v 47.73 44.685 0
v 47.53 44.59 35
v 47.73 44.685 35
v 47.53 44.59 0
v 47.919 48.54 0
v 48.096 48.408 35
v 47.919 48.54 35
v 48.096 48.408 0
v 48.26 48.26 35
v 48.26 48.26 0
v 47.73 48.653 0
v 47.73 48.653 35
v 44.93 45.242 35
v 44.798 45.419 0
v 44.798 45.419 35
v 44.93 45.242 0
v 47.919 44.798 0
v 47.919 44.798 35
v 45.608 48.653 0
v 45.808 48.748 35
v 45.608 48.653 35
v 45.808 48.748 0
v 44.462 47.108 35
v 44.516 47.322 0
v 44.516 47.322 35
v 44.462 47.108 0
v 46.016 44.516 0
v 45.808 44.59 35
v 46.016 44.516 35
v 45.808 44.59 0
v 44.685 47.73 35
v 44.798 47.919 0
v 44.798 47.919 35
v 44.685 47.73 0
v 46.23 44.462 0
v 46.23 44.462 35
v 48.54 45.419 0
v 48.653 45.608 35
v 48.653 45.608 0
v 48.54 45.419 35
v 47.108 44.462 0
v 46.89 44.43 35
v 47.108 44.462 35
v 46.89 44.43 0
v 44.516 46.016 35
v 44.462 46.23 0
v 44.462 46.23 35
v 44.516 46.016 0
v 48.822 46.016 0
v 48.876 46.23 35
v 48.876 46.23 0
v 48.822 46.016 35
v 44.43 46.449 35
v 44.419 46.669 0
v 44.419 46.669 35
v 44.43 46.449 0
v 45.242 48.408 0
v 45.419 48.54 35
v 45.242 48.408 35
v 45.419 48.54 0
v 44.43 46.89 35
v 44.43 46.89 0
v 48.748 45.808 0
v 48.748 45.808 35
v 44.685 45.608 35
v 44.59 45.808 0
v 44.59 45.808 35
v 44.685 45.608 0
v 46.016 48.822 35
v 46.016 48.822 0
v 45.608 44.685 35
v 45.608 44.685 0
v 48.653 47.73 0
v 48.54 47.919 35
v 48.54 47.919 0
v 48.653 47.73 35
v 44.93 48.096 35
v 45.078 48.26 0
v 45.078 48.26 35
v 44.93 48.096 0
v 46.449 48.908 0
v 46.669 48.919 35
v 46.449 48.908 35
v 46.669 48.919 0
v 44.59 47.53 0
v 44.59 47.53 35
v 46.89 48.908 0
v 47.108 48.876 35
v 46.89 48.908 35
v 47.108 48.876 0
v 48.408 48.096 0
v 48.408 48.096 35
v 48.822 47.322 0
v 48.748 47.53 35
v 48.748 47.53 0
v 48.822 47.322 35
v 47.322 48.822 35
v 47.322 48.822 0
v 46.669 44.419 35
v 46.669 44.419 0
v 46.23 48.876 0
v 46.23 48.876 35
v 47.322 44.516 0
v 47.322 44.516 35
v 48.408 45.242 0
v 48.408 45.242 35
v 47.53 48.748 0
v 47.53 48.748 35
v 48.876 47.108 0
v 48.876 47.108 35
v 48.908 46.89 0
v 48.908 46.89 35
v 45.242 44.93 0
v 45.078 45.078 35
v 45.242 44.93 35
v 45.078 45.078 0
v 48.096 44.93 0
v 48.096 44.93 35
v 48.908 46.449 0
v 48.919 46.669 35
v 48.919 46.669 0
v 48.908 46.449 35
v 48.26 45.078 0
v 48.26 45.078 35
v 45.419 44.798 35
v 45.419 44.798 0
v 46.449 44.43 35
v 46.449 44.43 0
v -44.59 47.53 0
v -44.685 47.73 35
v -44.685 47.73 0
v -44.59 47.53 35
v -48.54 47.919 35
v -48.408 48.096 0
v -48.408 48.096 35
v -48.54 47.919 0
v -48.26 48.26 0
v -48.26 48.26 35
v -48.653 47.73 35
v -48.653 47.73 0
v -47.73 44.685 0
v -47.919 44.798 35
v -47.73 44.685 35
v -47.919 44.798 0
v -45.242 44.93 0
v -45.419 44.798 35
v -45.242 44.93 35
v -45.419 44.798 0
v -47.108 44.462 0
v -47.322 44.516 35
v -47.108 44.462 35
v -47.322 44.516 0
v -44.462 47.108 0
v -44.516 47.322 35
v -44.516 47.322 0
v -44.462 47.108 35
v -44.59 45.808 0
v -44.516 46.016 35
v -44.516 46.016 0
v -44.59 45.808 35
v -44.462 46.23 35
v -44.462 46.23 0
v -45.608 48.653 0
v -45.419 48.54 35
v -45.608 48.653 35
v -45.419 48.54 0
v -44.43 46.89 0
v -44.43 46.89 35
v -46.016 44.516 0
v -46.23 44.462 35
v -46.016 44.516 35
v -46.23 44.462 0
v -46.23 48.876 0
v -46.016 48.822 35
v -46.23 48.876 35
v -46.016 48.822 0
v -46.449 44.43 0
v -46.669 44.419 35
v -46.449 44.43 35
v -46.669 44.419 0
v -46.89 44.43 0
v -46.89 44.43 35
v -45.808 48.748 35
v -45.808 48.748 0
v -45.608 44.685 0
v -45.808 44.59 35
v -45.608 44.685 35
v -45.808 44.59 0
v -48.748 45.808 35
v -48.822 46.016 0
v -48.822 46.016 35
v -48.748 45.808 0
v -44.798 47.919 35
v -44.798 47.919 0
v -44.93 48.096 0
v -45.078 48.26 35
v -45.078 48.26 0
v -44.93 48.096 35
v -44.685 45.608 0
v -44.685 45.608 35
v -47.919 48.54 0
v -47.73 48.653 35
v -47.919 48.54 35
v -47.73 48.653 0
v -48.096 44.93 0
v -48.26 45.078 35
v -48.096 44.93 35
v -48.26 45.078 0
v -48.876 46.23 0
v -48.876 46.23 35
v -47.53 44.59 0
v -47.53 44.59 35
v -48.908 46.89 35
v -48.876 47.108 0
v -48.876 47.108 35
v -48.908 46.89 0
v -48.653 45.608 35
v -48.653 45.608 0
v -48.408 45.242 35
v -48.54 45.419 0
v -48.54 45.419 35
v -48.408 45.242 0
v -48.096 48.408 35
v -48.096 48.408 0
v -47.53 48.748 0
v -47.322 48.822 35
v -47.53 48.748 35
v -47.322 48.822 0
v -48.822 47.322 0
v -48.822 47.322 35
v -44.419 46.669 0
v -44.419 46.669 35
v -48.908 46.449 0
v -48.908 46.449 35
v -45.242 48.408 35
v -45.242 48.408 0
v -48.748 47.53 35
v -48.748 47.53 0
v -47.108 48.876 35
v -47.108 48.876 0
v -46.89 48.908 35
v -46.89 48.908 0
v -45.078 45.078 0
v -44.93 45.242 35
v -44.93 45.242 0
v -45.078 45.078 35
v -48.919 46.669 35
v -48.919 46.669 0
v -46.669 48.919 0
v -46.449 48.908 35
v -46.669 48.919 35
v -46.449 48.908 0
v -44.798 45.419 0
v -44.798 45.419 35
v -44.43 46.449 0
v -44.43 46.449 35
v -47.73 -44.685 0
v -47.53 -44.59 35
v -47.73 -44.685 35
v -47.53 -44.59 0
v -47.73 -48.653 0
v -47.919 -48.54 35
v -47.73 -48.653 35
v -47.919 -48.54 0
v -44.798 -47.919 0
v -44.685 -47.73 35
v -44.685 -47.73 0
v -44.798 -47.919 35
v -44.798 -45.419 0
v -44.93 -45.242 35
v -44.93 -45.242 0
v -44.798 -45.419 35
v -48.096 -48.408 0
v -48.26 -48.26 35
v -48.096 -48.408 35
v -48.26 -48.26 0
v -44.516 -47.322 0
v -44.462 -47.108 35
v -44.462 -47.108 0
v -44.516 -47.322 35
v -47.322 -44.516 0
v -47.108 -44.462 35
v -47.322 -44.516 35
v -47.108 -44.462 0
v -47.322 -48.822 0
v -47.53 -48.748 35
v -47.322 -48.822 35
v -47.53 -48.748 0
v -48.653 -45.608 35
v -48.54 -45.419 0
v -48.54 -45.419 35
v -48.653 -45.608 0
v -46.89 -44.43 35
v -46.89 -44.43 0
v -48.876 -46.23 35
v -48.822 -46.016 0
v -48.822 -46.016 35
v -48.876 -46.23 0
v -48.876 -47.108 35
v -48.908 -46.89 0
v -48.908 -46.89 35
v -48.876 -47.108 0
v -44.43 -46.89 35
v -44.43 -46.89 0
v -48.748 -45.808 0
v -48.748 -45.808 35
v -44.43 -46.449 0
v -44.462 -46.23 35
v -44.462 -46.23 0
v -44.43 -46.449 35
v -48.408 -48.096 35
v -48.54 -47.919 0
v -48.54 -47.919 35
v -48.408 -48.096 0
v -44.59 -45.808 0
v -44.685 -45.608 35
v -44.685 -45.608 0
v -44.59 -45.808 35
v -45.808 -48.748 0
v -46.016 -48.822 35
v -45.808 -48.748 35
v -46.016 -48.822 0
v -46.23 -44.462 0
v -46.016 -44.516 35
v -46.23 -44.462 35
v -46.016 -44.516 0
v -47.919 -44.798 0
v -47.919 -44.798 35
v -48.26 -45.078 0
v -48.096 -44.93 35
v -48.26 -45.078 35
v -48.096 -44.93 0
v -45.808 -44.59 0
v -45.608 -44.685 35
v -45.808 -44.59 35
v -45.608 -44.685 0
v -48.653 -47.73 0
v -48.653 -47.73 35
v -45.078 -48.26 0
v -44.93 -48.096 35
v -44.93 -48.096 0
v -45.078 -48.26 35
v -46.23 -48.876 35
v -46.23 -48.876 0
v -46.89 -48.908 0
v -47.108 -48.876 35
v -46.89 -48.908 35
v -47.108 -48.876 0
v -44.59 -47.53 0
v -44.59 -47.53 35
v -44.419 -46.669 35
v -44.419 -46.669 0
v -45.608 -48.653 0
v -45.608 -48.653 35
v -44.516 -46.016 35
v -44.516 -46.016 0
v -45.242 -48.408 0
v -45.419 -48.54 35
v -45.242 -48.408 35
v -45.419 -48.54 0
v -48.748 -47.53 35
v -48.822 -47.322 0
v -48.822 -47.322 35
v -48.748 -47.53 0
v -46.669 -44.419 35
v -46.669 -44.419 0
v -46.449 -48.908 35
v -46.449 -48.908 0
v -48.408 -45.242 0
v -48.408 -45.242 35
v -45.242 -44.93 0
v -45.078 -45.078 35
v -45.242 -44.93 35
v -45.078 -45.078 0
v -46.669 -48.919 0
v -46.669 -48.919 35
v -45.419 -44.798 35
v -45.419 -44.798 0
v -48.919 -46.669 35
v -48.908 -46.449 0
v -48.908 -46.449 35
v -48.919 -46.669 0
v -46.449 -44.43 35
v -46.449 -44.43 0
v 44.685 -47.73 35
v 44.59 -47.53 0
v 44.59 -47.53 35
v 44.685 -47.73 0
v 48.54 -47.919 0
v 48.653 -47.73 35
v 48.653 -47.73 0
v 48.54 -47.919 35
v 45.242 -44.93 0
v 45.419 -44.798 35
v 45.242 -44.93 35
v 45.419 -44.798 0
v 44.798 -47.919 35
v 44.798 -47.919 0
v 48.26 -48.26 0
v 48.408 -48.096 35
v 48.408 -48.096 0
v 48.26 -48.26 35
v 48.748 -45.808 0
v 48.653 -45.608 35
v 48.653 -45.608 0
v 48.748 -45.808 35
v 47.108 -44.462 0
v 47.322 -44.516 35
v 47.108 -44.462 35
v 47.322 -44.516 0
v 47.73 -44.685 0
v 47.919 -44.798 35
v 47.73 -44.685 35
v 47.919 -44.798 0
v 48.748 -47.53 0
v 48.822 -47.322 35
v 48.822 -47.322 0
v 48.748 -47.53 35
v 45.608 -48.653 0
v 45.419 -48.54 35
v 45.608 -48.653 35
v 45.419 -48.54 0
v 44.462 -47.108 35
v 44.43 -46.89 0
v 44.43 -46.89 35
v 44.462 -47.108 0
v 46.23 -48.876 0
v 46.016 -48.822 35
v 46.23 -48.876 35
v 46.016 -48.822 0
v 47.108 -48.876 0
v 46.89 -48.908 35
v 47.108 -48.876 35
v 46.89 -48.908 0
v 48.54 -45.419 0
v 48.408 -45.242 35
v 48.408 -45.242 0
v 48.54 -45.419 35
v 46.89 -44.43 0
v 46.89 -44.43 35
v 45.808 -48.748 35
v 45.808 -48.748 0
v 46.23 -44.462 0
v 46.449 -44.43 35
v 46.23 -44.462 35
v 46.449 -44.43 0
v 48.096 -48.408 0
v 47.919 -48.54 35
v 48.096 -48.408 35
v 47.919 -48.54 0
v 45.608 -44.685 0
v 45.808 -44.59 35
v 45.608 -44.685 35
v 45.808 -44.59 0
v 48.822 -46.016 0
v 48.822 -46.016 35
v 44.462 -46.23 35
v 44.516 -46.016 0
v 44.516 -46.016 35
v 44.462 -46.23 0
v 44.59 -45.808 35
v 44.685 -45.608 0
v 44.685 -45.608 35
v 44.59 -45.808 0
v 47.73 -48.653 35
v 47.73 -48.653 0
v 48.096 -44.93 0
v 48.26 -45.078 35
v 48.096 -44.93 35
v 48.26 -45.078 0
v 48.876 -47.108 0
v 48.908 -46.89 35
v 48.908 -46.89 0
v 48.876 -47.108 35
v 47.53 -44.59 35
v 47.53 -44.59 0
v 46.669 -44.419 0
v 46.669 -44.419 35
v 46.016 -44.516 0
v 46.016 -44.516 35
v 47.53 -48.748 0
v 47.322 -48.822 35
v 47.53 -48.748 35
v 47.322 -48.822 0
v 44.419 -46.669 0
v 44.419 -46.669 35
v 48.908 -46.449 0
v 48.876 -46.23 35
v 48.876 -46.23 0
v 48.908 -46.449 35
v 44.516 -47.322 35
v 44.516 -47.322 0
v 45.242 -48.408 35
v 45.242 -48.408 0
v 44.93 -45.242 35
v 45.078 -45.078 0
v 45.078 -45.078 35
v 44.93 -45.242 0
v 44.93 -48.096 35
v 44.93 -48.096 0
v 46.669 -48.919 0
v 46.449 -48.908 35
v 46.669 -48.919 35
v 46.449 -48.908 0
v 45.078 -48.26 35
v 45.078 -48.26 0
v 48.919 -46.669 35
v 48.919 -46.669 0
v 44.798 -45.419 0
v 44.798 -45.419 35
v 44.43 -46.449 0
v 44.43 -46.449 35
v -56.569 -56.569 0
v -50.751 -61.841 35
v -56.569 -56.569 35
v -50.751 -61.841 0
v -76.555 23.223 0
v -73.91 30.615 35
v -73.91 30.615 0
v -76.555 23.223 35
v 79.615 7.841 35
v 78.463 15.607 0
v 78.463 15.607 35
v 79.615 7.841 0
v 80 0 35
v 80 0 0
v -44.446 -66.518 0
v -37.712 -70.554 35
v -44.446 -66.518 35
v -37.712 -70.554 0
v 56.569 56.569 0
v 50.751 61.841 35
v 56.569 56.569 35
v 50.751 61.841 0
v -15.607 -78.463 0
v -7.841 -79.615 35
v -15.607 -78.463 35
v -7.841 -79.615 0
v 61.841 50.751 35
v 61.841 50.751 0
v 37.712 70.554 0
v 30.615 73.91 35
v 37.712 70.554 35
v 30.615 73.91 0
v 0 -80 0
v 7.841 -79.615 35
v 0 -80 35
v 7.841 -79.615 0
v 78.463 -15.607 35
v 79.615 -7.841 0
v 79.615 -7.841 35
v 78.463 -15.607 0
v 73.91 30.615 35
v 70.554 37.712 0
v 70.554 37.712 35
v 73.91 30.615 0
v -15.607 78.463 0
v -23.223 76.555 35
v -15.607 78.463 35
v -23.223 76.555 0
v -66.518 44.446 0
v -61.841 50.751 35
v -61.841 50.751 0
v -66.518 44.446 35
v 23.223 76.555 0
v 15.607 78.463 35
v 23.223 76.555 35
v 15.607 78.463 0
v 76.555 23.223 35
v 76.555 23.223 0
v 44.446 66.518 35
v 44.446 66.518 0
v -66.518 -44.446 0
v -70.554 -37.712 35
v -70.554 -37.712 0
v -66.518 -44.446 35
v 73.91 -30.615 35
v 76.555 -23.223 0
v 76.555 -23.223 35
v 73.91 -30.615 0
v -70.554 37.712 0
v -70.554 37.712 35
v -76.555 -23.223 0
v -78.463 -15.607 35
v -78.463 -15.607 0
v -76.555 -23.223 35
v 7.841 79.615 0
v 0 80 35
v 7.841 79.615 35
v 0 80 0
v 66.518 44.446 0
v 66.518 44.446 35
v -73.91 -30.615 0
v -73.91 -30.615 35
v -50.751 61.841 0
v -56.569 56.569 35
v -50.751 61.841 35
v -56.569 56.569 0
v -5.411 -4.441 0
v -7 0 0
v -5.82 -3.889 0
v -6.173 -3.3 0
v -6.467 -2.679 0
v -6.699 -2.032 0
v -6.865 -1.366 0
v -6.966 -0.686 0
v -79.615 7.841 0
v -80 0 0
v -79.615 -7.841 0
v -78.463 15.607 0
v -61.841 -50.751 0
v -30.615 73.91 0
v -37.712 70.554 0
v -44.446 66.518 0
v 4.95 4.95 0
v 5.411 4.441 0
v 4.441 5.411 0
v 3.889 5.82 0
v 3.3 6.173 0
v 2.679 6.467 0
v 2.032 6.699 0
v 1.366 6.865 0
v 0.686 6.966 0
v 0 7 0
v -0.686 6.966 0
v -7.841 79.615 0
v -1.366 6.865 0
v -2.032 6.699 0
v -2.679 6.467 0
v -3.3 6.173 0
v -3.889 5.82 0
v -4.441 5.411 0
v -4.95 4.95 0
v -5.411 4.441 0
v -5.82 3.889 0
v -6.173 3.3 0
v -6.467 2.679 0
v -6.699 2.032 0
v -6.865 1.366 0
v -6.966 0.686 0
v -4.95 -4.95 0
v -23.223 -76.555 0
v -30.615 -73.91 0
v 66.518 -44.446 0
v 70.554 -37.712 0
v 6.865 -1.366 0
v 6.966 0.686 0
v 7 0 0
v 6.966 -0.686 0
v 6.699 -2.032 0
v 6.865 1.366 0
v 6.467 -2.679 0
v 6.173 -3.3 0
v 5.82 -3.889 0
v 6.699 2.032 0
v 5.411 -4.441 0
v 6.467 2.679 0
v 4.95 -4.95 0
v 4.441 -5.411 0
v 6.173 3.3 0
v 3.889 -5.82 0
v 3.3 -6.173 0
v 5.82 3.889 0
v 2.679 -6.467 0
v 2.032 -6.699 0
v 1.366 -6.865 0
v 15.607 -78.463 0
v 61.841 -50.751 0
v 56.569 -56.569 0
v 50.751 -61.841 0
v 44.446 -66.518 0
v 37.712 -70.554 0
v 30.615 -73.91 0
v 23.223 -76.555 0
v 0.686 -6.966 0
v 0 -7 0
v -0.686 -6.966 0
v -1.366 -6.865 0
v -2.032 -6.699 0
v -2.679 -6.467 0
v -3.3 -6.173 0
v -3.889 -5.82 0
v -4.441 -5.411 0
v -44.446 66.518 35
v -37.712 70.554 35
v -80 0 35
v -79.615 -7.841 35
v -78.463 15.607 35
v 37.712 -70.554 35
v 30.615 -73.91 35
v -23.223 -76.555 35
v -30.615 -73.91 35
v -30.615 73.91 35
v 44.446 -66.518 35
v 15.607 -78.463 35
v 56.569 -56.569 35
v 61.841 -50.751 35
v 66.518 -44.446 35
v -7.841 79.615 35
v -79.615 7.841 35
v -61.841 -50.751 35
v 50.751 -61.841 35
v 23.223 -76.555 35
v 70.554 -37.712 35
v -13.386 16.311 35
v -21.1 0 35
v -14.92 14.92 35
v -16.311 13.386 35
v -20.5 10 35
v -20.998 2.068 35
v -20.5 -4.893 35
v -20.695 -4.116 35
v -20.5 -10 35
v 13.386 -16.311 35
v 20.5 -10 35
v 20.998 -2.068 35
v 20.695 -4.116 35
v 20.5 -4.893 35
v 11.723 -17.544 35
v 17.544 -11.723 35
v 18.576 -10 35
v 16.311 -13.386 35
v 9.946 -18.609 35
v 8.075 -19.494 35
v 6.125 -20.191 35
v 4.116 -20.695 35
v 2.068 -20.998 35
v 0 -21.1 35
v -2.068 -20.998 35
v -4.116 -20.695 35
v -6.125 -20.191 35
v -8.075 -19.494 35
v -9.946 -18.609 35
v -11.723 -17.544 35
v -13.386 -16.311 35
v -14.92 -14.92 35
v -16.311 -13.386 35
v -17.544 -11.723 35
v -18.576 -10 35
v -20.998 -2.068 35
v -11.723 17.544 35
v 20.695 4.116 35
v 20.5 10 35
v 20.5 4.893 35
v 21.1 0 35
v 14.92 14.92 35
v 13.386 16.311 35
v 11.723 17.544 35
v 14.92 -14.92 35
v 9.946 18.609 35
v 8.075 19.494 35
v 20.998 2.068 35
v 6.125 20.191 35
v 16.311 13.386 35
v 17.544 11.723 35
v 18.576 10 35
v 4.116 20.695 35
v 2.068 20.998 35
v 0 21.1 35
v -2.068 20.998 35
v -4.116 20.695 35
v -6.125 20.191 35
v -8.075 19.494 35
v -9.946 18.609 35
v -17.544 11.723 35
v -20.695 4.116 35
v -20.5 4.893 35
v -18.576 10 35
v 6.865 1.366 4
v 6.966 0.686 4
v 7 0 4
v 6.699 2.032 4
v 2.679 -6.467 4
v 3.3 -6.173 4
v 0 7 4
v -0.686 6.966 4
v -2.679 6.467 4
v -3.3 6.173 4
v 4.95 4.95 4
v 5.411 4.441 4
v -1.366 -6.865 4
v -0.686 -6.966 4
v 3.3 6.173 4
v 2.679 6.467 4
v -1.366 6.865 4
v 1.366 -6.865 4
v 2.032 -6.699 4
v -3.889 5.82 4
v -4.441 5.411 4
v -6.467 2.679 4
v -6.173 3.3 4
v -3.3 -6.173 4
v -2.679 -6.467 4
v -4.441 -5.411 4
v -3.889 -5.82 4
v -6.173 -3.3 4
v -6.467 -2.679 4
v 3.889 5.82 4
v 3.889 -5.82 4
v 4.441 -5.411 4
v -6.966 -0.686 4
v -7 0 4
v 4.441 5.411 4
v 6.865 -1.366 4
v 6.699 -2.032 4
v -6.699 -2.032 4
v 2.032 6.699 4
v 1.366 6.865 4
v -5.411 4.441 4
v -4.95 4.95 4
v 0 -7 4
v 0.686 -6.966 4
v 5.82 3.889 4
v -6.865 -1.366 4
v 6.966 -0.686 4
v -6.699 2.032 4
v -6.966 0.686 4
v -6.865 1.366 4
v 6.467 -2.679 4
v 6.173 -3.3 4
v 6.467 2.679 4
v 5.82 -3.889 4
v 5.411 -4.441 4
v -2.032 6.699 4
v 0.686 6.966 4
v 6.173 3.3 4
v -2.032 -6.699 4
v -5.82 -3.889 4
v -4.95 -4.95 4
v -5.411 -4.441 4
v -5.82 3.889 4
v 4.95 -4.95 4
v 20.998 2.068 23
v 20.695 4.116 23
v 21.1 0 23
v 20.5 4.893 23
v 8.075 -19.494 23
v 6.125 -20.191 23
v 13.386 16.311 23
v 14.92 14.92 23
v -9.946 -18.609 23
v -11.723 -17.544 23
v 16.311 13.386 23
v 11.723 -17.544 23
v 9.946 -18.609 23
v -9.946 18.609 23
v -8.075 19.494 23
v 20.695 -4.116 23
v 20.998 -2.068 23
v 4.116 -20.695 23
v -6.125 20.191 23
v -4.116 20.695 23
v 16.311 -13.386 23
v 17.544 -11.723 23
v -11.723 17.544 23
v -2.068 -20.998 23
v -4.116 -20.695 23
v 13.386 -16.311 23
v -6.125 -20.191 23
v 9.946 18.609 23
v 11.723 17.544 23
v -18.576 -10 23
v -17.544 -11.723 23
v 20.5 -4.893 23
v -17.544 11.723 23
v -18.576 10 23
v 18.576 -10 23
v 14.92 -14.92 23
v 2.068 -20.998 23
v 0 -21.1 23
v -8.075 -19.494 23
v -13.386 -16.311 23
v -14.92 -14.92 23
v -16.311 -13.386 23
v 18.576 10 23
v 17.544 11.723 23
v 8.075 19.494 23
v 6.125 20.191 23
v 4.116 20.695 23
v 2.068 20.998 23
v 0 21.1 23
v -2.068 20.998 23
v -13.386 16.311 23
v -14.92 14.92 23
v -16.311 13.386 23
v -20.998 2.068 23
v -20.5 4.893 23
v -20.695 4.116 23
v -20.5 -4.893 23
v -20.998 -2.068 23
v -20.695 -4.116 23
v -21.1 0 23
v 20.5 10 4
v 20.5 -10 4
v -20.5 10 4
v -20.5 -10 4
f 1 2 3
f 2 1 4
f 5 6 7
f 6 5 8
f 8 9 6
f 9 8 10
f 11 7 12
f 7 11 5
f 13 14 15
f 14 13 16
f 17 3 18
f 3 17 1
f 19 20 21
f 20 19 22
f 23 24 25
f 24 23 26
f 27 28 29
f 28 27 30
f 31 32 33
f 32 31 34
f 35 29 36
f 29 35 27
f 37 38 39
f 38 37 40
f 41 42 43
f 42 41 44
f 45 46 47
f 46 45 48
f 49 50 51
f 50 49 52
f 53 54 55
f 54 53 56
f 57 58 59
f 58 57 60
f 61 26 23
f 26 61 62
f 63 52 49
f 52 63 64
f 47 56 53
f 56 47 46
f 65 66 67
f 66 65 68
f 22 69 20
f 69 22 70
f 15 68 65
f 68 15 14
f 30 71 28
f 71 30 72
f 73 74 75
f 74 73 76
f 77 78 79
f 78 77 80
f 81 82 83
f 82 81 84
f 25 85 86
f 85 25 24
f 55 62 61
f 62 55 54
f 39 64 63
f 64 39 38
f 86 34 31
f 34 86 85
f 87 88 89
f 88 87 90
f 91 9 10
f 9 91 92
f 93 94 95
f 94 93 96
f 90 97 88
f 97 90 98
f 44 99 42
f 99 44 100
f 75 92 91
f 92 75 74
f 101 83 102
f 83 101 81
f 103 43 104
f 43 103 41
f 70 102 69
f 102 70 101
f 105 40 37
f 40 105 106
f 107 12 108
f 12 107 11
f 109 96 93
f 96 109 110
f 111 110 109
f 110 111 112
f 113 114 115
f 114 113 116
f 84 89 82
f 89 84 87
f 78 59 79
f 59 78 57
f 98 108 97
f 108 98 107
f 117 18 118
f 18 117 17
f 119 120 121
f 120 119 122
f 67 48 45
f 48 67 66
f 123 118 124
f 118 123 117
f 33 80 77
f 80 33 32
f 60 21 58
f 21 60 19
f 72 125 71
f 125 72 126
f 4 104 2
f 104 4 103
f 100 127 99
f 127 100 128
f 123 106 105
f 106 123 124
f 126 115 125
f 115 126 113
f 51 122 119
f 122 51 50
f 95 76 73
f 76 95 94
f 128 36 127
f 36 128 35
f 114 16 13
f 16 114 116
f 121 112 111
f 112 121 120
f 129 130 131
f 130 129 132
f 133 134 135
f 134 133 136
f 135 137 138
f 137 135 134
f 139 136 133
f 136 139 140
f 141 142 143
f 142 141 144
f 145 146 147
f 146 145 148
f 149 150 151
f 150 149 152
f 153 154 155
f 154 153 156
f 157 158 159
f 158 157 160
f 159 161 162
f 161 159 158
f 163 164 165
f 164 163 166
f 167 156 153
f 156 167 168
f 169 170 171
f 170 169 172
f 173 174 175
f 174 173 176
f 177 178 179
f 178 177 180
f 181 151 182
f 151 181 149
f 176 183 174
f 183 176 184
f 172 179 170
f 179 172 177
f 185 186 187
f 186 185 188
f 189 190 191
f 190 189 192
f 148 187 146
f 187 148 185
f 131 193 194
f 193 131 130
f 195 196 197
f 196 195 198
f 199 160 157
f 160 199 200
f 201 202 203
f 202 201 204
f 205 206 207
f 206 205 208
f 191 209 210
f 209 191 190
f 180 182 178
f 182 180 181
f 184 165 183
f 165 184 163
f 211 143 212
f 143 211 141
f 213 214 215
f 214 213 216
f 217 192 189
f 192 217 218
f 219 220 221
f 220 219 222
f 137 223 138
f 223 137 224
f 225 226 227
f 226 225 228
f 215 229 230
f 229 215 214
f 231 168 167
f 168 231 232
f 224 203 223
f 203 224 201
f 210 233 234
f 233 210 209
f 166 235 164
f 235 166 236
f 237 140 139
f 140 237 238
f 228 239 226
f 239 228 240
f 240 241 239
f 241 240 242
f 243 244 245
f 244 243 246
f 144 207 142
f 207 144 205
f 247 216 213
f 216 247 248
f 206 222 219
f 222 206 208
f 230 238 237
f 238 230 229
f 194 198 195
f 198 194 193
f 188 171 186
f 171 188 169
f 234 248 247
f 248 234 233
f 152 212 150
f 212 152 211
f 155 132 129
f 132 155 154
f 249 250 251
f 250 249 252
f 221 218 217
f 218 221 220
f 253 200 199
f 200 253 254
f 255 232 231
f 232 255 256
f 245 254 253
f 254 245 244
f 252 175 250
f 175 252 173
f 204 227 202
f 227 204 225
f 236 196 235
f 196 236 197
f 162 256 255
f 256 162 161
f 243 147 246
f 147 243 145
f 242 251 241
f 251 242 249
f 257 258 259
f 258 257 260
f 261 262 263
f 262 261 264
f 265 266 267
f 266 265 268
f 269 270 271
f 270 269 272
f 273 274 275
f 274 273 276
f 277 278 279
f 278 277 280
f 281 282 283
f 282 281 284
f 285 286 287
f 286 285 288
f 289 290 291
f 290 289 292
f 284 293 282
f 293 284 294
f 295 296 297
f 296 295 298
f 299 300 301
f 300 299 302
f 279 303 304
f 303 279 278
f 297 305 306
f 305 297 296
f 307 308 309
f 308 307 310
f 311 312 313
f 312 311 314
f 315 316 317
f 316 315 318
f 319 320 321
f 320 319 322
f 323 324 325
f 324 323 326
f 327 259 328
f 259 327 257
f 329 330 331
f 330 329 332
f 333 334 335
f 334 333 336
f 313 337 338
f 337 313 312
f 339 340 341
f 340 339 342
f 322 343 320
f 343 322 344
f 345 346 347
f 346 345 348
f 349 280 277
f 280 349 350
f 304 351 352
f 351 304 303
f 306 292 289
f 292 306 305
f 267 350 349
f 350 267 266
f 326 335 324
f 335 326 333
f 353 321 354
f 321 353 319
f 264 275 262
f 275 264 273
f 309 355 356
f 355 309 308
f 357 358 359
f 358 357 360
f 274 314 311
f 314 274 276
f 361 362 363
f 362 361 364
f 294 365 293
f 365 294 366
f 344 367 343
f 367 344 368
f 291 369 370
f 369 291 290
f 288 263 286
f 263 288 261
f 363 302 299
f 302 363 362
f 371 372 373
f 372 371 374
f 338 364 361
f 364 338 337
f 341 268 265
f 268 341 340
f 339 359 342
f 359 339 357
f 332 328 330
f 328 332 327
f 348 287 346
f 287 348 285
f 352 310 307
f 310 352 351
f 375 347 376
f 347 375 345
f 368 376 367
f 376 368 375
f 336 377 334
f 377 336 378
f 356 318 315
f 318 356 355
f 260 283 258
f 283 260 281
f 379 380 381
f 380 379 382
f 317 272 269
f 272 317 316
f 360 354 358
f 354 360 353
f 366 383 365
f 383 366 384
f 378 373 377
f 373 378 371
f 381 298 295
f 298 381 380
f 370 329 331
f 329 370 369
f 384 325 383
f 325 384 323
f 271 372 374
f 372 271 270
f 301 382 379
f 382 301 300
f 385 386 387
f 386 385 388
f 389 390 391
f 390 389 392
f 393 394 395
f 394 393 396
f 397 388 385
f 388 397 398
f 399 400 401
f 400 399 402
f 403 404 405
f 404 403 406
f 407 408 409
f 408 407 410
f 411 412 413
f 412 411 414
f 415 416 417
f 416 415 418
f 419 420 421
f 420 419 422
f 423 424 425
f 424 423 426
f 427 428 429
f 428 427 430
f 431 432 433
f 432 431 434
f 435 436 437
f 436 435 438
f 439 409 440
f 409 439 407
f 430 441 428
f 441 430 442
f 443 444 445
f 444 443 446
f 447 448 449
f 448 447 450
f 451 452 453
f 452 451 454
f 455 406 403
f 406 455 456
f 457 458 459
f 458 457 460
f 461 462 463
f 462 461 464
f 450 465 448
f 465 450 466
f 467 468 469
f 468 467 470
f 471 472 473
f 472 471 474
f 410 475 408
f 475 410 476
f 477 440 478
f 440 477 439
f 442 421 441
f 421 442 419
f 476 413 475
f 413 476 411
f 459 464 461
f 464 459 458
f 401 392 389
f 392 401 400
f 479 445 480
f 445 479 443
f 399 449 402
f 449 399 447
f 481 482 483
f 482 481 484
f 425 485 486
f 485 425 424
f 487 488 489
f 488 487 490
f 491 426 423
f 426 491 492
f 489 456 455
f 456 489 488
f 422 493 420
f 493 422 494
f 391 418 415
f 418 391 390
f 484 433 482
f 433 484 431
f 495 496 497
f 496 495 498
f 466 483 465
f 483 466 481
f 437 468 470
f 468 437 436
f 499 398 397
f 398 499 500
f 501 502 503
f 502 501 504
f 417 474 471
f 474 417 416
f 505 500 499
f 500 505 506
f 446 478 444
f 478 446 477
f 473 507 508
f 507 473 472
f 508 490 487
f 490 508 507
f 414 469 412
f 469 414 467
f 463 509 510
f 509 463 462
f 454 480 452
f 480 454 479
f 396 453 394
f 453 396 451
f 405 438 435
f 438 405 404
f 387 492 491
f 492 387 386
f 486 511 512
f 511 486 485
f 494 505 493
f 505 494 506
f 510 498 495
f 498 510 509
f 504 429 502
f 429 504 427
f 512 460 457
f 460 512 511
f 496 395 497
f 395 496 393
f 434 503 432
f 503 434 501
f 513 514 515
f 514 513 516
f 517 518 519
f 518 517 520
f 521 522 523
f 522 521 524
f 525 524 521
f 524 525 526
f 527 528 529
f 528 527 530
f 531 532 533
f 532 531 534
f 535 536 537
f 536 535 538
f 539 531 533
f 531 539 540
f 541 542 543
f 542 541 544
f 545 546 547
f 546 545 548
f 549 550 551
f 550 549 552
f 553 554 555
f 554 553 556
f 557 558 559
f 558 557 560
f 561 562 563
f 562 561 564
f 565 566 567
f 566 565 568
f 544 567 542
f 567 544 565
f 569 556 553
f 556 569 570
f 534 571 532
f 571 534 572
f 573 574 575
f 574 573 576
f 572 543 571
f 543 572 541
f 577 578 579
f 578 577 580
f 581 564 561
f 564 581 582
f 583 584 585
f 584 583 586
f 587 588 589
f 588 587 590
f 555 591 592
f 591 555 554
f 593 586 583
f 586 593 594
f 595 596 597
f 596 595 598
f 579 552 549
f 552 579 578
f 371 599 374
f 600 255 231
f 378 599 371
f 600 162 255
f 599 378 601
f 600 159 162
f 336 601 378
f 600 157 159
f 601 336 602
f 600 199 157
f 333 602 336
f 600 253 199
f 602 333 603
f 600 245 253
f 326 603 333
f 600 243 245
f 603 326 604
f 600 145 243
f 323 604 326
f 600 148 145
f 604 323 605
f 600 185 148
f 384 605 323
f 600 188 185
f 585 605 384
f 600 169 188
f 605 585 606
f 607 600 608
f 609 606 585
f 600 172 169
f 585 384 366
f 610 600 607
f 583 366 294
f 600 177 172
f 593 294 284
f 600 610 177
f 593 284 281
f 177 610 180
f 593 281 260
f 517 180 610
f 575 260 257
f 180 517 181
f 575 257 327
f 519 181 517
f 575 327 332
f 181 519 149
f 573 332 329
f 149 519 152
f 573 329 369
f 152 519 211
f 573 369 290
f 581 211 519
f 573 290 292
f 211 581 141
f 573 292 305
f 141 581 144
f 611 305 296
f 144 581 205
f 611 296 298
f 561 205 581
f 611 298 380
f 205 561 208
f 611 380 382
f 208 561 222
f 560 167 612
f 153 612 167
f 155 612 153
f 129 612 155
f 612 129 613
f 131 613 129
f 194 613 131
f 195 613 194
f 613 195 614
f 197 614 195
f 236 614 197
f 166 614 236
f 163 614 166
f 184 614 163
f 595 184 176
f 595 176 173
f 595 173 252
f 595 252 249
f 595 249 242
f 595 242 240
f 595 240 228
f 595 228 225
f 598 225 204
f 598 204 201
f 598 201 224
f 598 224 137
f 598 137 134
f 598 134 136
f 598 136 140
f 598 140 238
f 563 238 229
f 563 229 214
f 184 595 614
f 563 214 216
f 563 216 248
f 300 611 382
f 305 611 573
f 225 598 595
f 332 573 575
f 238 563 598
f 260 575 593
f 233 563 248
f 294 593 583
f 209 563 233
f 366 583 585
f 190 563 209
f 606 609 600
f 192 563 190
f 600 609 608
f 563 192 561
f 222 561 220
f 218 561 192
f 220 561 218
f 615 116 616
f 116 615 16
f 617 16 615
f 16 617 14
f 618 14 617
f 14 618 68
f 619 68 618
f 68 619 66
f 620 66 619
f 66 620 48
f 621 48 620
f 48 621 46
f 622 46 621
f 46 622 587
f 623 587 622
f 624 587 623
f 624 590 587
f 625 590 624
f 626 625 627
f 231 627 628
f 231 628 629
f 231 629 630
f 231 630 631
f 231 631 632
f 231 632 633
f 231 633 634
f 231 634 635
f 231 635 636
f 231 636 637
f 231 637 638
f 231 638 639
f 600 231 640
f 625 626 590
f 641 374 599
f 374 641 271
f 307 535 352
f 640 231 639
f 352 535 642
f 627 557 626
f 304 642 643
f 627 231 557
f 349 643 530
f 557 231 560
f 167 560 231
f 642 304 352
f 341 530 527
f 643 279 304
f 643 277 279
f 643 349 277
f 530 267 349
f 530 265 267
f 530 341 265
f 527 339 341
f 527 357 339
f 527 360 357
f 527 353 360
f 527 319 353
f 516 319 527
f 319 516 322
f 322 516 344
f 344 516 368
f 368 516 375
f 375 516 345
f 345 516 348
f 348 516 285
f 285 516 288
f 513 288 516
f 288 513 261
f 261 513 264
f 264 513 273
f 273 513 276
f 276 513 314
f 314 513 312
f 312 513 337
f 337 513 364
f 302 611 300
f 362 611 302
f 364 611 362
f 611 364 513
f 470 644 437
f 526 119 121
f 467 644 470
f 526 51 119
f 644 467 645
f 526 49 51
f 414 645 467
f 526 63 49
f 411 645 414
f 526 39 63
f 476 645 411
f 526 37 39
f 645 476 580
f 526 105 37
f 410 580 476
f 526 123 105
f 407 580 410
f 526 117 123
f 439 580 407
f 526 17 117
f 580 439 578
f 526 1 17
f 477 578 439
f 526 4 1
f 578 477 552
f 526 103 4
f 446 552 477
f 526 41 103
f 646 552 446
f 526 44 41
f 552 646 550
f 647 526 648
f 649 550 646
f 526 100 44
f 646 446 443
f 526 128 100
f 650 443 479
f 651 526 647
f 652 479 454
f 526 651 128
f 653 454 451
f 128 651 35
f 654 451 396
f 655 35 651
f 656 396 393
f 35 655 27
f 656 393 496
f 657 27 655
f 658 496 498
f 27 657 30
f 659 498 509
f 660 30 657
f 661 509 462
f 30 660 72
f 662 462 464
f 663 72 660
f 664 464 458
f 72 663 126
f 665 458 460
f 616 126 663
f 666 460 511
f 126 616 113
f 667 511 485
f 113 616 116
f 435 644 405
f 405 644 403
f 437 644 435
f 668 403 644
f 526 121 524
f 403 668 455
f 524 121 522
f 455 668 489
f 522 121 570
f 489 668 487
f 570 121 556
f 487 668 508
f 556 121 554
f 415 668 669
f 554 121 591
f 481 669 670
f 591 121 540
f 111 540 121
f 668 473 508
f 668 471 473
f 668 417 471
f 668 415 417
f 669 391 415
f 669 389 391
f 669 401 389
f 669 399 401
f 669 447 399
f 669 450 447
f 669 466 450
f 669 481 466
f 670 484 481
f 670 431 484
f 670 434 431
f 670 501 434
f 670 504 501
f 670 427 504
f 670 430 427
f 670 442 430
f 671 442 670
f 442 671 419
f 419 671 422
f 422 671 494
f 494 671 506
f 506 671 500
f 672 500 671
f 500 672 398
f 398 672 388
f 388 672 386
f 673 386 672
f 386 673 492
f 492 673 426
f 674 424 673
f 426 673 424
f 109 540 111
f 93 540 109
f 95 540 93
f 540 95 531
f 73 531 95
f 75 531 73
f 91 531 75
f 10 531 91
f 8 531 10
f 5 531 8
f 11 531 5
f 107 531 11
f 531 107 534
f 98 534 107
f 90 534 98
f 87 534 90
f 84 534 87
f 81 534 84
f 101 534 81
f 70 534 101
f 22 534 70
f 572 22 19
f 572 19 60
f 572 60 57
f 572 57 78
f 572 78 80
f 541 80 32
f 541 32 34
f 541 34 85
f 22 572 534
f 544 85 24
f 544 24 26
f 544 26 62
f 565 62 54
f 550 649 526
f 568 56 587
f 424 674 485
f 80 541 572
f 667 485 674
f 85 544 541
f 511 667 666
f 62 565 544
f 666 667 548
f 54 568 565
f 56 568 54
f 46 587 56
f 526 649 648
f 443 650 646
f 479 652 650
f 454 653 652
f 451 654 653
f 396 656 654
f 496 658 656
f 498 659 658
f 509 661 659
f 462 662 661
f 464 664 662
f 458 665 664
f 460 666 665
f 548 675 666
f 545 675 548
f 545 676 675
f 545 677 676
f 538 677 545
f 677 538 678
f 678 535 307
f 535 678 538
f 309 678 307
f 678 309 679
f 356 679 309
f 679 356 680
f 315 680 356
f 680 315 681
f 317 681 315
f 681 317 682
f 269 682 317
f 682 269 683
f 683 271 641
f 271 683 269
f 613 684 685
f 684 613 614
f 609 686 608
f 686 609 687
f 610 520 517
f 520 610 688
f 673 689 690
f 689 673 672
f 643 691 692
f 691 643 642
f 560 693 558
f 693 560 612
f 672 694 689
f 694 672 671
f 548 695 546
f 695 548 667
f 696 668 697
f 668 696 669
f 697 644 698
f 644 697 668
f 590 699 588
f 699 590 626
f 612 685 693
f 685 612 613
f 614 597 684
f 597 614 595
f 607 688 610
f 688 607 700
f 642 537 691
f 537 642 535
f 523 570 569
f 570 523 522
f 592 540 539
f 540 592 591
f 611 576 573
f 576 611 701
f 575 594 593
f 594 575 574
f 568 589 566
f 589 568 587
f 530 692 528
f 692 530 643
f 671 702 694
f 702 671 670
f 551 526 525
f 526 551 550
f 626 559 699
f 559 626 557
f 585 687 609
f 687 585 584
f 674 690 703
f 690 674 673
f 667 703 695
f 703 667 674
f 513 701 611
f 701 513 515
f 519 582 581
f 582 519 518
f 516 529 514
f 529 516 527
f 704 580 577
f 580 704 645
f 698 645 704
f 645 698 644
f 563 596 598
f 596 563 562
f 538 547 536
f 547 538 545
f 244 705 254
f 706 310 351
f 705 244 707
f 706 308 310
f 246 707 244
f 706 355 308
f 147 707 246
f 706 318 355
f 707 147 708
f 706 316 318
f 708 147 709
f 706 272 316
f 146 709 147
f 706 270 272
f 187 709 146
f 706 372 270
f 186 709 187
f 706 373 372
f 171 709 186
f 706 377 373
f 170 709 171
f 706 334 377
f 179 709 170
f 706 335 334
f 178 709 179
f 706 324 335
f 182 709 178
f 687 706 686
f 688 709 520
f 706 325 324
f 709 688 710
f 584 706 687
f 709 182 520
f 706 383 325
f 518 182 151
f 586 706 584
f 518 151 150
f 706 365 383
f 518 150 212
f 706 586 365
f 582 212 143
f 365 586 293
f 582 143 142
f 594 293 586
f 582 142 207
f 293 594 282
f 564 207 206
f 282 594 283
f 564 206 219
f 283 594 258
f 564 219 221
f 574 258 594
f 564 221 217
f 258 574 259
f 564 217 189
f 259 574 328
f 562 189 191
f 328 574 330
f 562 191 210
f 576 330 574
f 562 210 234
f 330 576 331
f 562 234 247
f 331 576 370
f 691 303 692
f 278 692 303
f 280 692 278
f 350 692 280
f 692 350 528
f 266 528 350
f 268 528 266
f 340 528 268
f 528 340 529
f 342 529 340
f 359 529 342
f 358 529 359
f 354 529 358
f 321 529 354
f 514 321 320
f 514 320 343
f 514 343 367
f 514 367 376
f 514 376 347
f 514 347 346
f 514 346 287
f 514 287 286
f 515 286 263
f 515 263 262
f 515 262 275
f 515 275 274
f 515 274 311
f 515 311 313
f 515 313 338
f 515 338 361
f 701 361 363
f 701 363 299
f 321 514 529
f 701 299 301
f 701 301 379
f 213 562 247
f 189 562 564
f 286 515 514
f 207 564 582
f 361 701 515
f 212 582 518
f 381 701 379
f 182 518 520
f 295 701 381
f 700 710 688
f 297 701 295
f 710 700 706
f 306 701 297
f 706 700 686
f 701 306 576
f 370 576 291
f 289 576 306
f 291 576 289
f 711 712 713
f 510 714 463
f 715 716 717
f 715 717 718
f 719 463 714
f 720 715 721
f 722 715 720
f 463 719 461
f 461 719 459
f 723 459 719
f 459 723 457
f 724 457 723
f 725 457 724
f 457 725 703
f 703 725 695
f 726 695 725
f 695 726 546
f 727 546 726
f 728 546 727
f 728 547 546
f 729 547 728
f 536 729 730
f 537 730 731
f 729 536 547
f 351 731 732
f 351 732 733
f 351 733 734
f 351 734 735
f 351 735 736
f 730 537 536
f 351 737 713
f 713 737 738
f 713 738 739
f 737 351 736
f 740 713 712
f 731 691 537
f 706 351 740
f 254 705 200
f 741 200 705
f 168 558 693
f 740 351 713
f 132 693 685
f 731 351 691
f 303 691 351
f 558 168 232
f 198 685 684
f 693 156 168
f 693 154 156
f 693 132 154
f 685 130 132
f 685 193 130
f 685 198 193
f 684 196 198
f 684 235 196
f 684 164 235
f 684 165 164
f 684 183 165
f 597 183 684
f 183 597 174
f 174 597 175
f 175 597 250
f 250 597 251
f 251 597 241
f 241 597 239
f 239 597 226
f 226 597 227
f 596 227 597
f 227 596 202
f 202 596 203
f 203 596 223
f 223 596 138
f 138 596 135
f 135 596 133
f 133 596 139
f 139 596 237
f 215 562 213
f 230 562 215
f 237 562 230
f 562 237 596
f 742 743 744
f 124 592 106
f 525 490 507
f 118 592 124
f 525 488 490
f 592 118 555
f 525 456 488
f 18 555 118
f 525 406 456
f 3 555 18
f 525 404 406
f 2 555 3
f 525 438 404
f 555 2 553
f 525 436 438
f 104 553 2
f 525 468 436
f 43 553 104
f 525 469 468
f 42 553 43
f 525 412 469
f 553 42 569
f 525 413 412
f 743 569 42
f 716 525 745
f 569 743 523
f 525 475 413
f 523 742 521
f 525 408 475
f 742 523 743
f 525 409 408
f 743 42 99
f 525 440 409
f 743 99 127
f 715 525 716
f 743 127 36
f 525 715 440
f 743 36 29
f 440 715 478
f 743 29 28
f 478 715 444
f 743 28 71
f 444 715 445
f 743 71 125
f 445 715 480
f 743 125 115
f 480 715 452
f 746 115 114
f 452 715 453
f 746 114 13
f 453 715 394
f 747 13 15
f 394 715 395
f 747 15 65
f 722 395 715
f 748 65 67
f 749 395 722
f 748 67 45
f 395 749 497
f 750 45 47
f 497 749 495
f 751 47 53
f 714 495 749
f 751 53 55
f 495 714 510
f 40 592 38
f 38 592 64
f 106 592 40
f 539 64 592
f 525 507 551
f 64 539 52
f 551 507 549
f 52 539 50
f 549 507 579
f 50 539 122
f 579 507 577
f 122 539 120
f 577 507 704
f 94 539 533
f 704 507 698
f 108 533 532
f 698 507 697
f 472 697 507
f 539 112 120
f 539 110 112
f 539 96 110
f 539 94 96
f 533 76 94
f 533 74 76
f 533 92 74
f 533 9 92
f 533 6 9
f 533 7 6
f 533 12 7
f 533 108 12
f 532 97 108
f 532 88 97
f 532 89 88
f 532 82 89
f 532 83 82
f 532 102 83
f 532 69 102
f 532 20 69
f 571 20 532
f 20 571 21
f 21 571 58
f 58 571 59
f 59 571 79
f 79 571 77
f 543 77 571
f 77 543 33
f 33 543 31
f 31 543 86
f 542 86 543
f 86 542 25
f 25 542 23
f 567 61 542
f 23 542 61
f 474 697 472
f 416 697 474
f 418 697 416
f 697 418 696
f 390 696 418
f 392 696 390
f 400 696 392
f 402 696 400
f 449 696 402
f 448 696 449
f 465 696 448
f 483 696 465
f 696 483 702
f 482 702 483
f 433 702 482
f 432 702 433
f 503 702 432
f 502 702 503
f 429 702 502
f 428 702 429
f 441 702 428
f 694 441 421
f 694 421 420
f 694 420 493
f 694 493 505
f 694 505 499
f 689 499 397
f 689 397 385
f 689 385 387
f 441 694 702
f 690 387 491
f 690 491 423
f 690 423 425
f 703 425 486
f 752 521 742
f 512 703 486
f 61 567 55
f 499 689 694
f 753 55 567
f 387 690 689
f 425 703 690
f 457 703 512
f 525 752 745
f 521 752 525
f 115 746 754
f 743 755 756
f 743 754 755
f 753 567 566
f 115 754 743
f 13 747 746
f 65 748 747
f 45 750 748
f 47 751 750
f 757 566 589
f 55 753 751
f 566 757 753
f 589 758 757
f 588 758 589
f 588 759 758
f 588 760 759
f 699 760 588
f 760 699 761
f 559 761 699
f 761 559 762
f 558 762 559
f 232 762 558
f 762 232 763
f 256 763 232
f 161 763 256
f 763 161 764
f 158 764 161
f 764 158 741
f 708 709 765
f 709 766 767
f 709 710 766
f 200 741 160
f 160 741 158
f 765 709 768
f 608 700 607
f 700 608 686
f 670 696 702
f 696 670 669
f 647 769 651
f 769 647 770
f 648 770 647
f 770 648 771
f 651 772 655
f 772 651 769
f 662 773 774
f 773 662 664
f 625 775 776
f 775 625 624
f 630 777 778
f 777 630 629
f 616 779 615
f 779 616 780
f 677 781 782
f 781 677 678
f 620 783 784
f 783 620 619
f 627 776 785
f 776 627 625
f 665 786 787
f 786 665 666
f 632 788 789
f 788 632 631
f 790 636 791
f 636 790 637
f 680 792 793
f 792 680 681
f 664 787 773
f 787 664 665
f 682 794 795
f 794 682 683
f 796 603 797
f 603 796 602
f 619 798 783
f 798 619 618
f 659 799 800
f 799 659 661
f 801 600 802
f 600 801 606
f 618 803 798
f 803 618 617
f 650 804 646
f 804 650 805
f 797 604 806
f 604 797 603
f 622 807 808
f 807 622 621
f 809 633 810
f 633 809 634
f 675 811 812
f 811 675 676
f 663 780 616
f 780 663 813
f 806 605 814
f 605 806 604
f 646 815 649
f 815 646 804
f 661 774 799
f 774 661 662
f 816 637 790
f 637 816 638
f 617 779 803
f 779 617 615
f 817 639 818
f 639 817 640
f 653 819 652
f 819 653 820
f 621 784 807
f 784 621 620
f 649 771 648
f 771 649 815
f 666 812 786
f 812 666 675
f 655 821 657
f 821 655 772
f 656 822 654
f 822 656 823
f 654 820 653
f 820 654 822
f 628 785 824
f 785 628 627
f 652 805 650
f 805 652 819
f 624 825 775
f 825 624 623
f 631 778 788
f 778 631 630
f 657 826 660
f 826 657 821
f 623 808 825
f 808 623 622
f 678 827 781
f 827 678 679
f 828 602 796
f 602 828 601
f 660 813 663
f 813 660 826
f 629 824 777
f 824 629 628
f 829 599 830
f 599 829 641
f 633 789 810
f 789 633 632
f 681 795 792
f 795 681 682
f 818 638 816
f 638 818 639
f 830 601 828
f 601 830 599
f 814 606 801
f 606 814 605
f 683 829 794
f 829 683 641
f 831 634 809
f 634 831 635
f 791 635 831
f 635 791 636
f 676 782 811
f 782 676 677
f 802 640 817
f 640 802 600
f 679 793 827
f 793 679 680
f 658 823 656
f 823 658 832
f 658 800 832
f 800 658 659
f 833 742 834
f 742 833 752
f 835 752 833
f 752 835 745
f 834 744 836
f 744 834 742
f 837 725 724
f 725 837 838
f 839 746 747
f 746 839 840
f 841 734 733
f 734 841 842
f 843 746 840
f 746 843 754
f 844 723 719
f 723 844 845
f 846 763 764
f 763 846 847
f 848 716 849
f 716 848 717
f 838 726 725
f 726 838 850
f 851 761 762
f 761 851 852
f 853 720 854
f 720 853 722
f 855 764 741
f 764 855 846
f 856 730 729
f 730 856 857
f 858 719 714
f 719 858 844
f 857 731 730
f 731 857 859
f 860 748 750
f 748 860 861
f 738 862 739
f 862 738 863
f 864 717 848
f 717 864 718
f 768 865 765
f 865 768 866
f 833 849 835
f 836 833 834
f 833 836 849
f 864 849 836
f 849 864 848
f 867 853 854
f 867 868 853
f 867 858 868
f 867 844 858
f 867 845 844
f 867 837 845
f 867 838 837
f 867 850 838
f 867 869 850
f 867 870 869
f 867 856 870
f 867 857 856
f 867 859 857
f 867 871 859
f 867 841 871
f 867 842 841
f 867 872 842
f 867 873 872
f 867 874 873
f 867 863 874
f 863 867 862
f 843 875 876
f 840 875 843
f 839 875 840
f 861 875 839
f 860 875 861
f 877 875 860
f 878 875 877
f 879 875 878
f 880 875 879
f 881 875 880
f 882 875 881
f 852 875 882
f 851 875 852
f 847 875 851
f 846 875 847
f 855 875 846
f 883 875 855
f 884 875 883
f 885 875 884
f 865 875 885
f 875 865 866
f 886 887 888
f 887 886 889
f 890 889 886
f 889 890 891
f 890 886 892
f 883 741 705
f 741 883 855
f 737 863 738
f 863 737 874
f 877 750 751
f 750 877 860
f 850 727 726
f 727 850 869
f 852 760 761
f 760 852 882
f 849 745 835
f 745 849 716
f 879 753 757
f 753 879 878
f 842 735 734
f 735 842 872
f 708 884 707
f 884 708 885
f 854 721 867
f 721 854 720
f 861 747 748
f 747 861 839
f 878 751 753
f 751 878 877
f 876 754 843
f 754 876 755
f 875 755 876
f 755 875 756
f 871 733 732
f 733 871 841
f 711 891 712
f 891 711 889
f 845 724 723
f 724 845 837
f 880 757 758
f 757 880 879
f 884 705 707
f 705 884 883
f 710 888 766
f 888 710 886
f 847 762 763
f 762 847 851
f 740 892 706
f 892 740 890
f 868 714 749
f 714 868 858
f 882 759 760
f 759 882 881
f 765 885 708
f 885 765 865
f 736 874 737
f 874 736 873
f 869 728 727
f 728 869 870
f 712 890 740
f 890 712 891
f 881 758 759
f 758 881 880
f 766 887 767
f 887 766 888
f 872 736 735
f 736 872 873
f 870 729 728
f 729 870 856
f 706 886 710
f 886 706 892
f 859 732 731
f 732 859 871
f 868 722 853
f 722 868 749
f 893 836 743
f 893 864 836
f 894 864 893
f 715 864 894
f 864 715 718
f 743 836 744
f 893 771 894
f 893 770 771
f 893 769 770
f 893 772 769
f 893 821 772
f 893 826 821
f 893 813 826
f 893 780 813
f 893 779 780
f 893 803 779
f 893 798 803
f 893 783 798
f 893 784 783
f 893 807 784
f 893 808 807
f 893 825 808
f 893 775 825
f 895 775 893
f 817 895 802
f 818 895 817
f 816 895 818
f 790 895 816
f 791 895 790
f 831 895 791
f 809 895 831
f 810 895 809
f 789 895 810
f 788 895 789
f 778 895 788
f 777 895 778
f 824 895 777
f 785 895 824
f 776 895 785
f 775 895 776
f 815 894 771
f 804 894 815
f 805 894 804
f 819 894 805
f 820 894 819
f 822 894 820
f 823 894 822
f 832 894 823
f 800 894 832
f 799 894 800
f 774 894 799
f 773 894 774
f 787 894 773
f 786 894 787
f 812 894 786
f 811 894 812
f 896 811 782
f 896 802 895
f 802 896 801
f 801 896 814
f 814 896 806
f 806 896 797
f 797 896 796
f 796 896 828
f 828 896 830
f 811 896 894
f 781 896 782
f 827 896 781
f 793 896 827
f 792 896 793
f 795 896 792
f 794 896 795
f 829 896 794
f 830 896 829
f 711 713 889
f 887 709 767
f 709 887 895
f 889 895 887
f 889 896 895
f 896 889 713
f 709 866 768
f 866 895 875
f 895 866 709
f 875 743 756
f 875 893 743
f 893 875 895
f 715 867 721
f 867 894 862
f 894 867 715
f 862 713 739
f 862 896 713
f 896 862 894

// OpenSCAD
// Valkarye V3 - Part 01: Base Turntable & Thrust Bearing Housing
// OpenSCAD Parametric Part

$fn = 64;

BASE_DIAMETER     = 160;
BASE_HEIGHT       = 35;
BEARING_OD        = 42.2; // 51105 Thrust Bearing Pocket
BEARING_ID        = 25.0;
BEARING_DEPTH     = 12.0;
WIRE_BORE         = 14.0;
SERVO_L           = 41.0;
SERVO_W           = 20.0;

module base_housing() {
    difference() {
        cylinder(d = BASE_DIAMETER, h = BASE_HEIGHT);
        // Center hollow bore
        translate([0, 0, -1]) cylinder(d = WIRE_BORE, h = BASE_HEIGHT + 2);
        // Thrust bearing seat
        translate([0, 0, BASE_HEIGHT - BEARING_DEPTH])
            cylinder(d = BEARING_OD, h = BEARING_DEPTH + 1);
        // Servo pocket
        translate([-SERVO_L/2, -SERVO_W/2, 4])
            cube([SERVO_L, SERVO_W, BASE_HEIGHT]);
        // Desk mounting holes (4x M4)
        for (a = [45, 135, 225, 315]) {
            rotate([0, 0, a])
                translate([BASE_DIAMETER/2 - 14, 0, -1])
                    cylinder(d = 4.5, h = BASE_HEIGHT + 2);
        }
    }
}

base_housing();
